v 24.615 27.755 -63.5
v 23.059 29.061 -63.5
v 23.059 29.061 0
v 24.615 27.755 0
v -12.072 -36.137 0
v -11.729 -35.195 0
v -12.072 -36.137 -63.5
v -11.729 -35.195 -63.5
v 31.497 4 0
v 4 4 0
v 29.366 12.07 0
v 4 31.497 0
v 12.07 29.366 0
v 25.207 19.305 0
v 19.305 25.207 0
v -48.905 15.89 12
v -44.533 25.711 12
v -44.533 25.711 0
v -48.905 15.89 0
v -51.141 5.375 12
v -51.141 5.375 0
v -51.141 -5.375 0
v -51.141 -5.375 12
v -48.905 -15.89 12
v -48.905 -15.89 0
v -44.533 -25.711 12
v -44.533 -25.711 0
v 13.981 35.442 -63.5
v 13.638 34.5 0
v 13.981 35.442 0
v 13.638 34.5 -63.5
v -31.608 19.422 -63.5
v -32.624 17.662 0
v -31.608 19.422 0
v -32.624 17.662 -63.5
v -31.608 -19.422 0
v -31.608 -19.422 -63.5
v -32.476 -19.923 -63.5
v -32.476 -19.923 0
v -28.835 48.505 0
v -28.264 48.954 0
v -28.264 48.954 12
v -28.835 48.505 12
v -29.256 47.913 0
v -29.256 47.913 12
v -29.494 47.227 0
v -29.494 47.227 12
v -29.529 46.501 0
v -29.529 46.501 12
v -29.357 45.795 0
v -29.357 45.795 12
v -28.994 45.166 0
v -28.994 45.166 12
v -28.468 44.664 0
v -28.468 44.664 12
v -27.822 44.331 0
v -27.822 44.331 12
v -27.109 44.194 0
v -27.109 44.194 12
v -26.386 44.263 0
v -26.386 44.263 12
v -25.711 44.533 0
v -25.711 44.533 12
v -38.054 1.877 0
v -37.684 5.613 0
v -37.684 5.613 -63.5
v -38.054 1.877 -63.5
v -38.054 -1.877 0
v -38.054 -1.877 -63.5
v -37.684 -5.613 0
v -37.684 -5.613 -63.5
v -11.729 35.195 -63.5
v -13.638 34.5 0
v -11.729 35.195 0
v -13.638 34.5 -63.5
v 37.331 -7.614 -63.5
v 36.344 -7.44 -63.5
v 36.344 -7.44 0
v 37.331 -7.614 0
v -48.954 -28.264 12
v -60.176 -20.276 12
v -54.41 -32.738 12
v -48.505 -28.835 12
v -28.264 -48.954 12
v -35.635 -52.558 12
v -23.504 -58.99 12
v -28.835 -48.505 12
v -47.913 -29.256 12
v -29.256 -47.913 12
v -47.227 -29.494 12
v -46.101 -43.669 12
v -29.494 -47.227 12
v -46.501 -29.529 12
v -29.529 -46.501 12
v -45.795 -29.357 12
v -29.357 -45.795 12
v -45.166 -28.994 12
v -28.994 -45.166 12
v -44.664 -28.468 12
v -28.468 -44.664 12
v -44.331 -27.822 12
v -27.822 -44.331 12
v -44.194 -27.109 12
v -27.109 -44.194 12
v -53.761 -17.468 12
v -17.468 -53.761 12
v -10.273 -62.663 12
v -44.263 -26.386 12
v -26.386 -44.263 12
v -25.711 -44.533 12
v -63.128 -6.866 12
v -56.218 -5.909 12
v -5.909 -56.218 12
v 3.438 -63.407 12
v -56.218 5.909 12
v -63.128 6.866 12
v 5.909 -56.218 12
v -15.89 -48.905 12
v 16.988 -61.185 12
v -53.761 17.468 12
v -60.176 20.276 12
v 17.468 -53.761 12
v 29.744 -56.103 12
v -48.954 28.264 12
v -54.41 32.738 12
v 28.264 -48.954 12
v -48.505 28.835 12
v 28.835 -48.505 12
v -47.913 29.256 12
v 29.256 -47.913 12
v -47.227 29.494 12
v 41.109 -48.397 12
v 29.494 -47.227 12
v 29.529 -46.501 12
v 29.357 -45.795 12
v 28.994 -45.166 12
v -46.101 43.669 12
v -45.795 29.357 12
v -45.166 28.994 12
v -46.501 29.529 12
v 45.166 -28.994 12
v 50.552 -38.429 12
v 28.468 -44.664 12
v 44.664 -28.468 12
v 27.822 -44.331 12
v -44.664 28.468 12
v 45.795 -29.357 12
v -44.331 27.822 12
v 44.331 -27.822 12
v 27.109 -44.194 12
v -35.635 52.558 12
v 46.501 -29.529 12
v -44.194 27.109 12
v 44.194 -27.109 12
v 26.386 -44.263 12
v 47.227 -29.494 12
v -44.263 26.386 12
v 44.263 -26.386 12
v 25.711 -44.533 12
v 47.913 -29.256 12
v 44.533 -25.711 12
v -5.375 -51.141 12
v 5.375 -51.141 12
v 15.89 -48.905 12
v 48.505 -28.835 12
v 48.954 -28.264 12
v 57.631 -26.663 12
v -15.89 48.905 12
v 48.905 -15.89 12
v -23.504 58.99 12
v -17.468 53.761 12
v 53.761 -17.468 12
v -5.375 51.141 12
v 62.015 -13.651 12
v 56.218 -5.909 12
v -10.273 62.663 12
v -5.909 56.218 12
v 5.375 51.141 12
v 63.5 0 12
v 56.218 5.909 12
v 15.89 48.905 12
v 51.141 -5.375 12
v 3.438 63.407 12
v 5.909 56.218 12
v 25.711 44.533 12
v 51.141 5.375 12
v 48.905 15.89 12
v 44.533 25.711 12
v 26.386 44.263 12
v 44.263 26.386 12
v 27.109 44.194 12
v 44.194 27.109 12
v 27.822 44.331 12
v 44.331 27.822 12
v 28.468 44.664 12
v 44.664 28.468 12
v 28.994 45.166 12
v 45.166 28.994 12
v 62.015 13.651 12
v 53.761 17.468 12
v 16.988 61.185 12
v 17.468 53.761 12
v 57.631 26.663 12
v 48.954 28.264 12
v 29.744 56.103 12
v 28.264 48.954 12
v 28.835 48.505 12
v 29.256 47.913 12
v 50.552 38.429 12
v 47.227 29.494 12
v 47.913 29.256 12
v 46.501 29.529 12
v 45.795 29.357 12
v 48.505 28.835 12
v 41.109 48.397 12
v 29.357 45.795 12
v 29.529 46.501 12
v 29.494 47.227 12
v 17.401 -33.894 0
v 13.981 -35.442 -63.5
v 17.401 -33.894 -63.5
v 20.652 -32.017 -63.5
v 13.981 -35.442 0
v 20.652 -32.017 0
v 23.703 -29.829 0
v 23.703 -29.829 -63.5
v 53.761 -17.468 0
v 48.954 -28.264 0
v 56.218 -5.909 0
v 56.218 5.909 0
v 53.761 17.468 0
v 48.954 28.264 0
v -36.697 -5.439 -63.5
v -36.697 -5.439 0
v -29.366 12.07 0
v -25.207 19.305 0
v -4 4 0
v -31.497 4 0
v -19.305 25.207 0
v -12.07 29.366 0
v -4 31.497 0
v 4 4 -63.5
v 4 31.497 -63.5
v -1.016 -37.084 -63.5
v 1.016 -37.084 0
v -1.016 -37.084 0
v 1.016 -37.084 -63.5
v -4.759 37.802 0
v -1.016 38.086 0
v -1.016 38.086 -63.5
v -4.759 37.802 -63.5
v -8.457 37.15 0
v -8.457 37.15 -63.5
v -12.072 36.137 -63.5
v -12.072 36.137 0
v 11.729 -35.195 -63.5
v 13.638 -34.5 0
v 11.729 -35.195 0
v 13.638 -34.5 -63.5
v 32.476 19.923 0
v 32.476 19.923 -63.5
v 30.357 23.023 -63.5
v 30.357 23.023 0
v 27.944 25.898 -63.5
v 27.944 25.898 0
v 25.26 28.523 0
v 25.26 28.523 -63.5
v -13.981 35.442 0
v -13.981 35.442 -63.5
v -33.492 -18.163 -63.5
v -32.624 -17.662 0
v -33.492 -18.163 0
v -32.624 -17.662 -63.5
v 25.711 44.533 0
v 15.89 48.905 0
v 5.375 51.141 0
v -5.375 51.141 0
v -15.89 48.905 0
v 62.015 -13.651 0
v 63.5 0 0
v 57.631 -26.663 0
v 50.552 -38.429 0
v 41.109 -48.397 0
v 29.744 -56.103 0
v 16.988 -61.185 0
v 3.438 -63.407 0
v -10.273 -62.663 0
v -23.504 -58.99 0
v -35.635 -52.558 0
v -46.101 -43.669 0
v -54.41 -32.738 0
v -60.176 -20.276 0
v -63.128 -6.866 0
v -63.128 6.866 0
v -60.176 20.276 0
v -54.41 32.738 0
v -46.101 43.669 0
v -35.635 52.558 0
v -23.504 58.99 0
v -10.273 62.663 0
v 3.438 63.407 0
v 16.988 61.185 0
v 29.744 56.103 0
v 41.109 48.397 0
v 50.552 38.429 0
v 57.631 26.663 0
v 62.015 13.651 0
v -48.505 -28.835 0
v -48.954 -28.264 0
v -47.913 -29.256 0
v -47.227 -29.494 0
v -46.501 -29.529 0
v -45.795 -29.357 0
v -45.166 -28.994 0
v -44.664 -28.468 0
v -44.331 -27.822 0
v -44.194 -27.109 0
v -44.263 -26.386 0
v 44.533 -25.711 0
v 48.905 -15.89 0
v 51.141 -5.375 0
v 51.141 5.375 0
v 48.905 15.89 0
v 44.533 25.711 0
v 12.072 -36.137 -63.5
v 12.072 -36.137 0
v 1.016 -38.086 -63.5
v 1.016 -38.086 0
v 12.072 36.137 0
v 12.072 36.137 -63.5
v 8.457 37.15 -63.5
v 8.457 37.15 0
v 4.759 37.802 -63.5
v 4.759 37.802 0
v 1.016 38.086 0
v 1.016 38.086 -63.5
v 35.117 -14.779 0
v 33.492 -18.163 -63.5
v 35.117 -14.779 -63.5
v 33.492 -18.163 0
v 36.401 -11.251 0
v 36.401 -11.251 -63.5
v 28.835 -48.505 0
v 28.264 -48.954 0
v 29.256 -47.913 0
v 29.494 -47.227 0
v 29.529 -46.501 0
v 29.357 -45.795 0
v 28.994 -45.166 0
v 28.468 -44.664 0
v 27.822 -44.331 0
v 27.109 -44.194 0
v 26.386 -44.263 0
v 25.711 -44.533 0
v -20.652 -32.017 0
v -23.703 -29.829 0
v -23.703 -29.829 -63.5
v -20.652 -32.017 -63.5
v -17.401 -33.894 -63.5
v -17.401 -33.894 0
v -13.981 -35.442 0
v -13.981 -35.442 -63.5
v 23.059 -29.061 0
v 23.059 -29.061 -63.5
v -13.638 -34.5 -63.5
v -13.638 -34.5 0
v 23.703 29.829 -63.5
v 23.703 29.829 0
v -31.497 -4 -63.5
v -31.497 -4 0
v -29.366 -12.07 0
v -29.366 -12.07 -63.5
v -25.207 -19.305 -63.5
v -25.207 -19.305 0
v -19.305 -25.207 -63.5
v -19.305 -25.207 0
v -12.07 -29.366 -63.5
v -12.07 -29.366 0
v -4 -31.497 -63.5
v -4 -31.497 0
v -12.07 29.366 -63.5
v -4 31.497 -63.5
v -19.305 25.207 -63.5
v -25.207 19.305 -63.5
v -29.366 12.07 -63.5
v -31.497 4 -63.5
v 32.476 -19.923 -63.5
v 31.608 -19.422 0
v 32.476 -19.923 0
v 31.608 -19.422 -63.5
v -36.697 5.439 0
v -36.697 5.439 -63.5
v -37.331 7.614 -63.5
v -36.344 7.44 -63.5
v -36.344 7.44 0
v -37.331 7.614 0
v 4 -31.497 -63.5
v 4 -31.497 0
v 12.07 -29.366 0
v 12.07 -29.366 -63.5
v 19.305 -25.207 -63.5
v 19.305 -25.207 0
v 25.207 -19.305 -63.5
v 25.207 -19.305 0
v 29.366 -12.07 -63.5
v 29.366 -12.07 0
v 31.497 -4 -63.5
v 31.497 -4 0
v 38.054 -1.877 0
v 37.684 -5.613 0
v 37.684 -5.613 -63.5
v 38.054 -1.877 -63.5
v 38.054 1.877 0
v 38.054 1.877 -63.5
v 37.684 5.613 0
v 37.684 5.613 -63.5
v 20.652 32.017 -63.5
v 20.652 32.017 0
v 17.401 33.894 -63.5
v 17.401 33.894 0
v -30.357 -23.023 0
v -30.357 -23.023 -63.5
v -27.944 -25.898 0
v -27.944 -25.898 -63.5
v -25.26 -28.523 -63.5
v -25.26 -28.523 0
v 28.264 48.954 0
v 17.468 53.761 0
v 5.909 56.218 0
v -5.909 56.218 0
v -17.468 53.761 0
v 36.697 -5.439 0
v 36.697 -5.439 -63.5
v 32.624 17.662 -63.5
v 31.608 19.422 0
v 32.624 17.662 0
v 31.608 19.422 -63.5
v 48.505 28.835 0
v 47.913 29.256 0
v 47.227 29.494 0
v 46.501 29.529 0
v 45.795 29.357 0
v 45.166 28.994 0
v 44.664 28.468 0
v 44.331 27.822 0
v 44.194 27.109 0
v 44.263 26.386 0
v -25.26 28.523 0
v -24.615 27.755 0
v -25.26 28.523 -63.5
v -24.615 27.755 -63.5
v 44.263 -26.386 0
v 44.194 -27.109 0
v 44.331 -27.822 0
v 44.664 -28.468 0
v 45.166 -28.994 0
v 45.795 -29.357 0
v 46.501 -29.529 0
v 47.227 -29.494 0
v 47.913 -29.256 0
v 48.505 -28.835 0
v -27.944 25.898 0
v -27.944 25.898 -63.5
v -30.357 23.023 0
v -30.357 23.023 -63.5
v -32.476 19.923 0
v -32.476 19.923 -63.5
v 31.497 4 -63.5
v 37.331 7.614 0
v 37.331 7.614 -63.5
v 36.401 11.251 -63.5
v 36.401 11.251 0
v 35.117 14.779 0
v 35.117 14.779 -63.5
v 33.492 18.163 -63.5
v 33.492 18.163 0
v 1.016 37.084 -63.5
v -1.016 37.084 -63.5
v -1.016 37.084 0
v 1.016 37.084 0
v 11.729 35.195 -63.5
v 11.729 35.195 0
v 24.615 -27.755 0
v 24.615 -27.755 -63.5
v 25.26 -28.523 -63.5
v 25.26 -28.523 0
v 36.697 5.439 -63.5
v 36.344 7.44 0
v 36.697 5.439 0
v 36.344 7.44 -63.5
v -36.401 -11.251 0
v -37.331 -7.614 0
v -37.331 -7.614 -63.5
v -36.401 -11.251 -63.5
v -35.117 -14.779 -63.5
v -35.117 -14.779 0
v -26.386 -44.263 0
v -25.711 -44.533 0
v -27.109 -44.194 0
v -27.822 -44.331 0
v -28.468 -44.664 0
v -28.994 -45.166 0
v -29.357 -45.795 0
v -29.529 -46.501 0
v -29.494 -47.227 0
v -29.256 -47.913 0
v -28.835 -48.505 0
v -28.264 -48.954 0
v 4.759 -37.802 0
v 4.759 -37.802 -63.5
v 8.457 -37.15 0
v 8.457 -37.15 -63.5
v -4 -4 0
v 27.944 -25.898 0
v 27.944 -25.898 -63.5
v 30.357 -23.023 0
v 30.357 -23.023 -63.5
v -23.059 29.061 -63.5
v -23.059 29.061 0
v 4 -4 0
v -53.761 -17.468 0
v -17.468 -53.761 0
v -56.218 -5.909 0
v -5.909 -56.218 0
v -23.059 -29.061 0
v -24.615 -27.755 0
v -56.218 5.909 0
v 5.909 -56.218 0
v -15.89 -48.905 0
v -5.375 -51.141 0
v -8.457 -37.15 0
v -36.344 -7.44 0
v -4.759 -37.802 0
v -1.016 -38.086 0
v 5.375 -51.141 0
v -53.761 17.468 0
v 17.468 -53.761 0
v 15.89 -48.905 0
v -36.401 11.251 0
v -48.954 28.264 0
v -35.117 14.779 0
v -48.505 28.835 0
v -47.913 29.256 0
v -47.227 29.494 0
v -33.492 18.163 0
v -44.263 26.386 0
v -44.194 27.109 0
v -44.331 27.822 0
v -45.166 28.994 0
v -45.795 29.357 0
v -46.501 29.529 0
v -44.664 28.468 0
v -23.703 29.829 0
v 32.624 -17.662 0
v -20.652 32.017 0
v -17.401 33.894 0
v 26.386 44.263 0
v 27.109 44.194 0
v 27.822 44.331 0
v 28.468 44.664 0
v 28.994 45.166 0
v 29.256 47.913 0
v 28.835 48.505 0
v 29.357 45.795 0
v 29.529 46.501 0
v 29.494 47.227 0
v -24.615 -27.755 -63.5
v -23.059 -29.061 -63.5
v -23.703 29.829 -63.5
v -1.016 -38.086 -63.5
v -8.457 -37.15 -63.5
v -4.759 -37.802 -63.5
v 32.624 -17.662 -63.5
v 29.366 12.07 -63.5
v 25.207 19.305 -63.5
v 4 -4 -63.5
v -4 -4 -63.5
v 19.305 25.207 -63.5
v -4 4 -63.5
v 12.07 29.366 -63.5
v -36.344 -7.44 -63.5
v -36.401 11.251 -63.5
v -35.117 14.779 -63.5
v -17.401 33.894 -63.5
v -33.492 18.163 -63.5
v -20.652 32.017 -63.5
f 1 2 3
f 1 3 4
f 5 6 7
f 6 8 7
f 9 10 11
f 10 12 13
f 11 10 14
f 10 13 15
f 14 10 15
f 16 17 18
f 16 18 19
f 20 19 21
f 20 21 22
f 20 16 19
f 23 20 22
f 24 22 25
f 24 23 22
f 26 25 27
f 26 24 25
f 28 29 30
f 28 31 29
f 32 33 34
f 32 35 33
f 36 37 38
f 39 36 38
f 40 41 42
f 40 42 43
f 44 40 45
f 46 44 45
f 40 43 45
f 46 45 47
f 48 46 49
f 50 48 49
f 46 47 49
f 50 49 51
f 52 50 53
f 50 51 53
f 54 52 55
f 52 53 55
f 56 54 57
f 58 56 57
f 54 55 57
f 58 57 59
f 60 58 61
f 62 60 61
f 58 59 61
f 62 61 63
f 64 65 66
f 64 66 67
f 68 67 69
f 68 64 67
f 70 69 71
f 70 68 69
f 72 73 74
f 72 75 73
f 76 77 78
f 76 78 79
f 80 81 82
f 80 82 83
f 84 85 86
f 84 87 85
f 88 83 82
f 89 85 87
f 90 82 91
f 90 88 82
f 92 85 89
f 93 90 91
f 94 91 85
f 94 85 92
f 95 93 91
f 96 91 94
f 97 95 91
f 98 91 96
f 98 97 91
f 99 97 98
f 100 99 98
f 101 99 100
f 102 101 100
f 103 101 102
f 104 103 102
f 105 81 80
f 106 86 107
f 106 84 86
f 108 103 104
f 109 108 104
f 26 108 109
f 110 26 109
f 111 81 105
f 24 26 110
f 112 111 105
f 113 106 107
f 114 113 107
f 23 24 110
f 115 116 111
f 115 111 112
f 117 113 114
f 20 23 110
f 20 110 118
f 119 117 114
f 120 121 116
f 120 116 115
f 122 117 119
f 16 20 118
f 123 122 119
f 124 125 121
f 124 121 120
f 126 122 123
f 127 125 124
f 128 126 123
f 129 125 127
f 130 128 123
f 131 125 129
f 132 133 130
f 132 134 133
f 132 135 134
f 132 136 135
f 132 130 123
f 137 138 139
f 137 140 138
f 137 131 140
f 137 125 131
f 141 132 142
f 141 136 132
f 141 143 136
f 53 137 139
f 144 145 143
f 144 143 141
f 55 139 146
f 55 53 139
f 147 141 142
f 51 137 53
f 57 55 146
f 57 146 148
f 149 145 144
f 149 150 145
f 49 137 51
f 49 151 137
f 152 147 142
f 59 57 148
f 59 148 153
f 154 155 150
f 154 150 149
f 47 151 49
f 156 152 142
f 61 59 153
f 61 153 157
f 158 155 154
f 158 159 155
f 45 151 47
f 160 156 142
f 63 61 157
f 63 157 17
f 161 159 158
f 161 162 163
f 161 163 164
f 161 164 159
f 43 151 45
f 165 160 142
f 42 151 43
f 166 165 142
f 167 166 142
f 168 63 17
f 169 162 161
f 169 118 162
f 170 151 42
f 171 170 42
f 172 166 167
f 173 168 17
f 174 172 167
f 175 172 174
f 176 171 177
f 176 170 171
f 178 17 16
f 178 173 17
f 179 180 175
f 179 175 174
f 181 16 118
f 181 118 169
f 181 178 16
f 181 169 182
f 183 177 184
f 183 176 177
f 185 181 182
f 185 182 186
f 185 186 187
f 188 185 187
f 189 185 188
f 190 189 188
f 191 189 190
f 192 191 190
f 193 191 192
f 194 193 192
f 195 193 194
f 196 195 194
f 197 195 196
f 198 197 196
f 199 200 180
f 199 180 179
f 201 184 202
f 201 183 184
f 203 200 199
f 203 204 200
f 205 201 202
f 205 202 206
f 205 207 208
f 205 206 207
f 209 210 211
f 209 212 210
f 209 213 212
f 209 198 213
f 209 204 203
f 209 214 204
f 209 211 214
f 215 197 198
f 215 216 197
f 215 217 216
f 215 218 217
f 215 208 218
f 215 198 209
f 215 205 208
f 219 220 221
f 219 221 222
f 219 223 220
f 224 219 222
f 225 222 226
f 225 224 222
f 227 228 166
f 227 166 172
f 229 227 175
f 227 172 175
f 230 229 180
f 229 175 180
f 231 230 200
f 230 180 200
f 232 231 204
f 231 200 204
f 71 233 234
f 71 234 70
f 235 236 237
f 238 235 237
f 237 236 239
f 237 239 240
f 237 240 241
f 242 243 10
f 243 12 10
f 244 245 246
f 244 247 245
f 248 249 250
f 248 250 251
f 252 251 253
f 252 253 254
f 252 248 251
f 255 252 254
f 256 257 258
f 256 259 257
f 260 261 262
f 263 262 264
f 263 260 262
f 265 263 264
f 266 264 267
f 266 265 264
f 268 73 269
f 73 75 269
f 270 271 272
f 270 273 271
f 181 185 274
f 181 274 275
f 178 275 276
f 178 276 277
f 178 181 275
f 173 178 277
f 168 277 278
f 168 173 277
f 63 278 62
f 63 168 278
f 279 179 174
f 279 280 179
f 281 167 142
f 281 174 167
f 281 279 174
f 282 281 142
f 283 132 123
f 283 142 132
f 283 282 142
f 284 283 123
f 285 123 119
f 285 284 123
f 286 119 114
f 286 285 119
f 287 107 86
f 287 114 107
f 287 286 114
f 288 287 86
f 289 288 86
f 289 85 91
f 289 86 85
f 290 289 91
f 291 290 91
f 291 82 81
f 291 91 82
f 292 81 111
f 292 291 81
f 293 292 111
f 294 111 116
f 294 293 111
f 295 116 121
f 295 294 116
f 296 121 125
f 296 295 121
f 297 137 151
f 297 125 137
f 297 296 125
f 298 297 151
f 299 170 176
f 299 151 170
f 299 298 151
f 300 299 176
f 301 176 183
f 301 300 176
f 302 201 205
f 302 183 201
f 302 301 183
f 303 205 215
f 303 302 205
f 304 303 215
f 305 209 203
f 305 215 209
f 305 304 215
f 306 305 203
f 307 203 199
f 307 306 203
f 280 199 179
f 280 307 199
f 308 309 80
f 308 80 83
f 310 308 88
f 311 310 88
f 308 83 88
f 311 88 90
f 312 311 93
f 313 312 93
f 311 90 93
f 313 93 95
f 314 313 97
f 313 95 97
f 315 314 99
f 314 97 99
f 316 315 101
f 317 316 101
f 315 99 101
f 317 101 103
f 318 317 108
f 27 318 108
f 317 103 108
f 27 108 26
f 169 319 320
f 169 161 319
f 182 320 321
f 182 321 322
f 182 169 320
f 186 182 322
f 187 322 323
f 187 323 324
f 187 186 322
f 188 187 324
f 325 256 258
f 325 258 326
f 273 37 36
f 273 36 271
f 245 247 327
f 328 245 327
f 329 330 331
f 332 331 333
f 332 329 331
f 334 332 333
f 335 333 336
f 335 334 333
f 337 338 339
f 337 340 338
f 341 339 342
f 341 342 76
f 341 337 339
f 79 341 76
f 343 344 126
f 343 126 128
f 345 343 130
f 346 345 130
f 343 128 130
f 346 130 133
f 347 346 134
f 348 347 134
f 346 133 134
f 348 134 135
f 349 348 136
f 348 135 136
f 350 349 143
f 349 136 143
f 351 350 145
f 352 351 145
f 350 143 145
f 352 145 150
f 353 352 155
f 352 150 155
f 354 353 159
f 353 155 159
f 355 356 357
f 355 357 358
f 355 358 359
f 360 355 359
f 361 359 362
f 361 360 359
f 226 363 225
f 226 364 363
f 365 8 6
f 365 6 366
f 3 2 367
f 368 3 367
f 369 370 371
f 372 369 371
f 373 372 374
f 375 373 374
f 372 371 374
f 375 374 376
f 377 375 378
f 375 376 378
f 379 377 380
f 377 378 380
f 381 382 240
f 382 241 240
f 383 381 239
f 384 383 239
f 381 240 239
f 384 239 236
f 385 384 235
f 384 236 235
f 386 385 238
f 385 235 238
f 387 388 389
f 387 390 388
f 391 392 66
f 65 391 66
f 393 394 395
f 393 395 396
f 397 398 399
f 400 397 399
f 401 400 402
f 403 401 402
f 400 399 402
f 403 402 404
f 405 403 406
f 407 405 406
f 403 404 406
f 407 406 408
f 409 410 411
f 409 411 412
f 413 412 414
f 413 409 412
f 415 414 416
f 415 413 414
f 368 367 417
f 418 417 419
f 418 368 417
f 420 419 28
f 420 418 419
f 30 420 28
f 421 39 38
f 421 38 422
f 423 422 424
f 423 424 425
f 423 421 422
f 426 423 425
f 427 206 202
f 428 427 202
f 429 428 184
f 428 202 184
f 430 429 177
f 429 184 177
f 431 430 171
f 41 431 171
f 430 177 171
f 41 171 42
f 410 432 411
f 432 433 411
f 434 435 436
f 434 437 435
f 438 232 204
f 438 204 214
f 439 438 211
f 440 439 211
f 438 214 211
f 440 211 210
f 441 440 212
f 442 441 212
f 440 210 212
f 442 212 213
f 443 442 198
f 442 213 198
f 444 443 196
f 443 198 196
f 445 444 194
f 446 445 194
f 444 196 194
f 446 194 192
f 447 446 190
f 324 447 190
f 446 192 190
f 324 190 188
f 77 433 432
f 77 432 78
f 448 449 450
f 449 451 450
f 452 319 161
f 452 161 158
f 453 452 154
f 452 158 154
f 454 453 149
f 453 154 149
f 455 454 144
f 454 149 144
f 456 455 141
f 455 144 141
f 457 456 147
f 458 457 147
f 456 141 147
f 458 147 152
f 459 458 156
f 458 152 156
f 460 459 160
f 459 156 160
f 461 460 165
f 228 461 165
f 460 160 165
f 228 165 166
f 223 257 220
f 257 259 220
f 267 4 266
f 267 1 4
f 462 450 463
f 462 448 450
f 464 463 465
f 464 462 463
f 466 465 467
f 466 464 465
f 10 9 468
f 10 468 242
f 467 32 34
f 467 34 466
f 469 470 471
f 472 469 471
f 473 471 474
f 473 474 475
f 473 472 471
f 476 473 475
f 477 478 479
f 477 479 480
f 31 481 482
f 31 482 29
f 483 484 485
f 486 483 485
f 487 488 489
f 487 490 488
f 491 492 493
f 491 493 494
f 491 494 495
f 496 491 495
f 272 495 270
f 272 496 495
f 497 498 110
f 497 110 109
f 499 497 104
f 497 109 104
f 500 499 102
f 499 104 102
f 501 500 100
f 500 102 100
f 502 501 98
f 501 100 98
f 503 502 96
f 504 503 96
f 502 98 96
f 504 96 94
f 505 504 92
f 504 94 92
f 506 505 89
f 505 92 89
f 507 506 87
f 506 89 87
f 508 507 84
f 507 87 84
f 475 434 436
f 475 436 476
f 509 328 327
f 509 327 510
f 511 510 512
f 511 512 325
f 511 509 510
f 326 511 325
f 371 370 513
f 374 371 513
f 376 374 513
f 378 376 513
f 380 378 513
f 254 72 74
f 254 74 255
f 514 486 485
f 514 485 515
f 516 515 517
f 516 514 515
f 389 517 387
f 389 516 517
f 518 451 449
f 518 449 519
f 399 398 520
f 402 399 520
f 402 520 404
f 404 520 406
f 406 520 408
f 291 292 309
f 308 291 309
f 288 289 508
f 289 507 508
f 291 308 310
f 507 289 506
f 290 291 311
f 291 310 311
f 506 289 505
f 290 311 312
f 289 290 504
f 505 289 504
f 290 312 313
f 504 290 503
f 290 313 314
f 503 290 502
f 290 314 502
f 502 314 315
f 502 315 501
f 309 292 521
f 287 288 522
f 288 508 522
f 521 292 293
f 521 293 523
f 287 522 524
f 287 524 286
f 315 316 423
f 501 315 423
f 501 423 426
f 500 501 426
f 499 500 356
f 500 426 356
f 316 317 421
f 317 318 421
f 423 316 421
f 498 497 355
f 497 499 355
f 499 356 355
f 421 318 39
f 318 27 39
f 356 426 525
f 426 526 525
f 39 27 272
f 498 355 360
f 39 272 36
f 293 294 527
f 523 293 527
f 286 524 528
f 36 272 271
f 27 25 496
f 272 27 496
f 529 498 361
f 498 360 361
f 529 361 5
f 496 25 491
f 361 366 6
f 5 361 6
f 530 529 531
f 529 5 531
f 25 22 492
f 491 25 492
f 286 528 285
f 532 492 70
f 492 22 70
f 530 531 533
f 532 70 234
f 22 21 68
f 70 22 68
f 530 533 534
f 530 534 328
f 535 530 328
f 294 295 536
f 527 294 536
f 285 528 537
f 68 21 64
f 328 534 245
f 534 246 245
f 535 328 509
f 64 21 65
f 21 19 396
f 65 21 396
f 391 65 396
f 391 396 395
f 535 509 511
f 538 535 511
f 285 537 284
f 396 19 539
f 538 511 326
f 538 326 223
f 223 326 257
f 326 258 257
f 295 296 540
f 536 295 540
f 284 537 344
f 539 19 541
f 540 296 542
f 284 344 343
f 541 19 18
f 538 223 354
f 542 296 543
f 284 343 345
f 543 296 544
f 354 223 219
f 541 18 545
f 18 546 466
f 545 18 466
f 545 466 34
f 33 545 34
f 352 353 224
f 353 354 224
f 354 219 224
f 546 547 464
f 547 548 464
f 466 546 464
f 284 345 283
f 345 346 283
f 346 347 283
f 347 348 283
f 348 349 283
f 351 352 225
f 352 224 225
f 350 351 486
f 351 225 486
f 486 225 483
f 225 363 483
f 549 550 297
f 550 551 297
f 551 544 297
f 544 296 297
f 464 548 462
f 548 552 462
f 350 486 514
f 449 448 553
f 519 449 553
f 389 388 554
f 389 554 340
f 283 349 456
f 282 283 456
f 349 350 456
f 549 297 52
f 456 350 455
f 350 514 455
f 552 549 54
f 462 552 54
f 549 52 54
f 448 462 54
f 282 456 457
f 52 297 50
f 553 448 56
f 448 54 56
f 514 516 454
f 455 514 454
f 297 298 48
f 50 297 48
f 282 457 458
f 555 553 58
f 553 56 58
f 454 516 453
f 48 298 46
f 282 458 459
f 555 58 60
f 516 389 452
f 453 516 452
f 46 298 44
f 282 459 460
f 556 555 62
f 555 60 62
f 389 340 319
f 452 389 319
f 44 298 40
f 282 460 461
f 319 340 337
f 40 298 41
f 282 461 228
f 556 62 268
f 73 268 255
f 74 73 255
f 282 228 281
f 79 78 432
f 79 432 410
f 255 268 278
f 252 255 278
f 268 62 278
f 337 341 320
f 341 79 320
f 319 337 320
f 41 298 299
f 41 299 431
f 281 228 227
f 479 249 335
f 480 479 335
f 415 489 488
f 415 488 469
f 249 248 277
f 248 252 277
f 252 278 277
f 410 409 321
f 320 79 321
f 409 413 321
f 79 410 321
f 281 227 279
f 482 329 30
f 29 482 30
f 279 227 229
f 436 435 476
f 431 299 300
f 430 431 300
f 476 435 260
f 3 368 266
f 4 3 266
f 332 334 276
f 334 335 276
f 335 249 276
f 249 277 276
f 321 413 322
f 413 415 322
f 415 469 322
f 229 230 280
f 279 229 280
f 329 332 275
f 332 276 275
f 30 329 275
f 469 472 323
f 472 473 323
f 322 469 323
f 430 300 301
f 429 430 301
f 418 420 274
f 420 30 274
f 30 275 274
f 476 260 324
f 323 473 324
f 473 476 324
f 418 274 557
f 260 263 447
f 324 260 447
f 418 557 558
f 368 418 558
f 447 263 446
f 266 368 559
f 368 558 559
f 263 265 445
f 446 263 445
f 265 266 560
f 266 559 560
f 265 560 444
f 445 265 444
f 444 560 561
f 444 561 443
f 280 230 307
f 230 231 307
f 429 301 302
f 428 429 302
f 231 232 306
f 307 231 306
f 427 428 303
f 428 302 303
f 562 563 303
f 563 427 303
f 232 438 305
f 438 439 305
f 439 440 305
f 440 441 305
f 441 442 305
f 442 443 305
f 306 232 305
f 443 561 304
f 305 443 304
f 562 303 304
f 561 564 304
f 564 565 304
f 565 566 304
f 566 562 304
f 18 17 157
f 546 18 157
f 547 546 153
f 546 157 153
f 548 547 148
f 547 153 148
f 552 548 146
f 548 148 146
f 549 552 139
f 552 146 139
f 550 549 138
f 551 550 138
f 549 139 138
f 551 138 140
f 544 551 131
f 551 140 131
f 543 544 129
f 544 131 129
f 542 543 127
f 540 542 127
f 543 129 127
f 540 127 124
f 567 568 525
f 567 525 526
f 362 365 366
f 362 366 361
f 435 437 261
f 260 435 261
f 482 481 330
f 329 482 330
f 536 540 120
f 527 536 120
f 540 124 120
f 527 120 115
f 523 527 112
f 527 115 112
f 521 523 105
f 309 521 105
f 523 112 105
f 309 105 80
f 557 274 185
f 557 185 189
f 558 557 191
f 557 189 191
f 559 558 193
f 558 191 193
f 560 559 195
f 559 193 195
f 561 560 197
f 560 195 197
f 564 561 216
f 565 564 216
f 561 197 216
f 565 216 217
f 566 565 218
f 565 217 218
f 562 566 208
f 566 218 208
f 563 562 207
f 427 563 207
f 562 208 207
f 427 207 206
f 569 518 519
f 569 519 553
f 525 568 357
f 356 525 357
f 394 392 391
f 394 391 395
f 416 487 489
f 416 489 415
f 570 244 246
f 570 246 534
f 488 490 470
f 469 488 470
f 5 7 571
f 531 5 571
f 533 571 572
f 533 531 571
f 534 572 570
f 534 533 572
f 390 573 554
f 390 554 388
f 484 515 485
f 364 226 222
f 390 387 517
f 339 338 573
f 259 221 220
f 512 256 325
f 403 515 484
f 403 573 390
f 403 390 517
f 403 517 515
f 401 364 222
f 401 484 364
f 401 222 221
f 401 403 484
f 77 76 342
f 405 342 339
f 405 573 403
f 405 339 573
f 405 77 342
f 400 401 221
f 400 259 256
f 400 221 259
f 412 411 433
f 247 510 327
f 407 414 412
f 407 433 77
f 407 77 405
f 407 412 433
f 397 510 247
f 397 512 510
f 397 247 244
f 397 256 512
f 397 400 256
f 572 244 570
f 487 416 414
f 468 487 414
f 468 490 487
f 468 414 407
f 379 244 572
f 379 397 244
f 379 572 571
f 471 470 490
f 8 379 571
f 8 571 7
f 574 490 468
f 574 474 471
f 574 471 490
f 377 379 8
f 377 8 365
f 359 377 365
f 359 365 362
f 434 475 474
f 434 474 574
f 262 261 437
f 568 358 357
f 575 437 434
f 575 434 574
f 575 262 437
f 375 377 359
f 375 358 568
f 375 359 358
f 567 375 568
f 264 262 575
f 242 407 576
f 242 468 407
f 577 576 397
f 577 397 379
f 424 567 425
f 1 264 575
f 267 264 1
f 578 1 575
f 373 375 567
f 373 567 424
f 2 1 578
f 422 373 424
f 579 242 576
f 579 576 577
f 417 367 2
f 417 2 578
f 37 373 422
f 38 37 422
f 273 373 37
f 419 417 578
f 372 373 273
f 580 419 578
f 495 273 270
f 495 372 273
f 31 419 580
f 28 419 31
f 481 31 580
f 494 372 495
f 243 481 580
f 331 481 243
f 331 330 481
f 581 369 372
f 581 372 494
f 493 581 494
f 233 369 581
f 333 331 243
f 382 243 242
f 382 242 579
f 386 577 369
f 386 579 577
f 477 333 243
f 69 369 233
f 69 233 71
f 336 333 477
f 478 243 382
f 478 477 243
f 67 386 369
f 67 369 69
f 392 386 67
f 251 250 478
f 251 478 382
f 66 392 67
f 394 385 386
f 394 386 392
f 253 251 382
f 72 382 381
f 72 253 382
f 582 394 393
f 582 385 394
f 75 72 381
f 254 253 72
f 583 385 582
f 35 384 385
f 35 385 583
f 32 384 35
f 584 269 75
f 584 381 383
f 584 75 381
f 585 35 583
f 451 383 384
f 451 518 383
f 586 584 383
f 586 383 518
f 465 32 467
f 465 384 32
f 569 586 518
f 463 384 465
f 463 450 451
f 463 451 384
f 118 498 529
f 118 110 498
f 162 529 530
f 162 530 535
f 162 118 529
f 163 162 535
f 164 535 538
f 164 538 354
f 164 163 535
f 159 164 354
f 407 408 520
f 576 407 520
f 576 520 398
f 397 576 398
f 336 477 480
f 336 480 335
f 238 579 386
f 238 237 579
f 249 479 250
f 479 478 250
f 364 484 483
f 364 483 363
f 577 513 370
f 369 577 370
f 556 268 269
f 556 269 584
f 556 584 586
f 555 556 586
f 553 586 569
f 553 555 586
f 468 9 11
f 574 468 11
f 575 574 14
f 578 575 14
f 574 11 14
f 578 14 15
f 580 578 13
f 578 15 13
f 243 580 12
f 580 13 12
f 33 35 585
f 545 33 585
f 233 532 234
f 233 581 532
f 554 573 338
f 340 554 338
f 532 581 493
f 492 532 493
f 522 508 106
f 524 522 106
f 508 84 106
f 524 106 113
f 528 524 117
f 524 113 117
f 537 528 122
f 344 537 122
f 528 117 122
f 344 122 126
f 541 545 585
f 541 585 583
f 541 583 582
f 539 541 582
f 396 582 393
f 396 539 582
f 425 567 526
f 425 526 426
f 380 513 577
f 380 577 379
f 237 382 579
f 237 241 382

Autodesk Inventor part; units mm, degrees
ref_plane "YZ Plane" through (0, 0, 0) normal (1, 0, 0) x (0, 1, 0)
ref_plane "XZ Plane" through (0, 0, 0) normal (0, 1, 0) x (-1, 0, 0)
ref_plane "XY Plane" through (0, 0, 0) normal (0, 0, 1) x (1, 0, 0)
sketch "Sketch1" plane through (0, 0, 0) normal (0, 0, 1) x (1, 0, 0)
  circle A0 centre (0, 0) radius 38.1
  circle A1 centre (0, 0) radius 63.5
  circle A2 centre (0, 0) radius 31.75
  dimension "d1" = 76.2
  dimension "d7" = 6.35
  dimension "d45" = 127
extrude "Extrusion2" add sketch "Sketch1" along normal blind 12 contours A0 | A1 | A2
extrude "Extrusion3" add sketch "Sketch1" against normal blind 63.5 contours A0
sketch "Sketch6" plane through (0, 0, 12) normal (0, 0, 1) x (1, 0, 0)
  arc A0 (26.9875, 46.7437) -> (-26.9875, 46.7437) centre (0, 0) ccw construction
  arc A1 (28.2638, 48.9544) -> (-28.2639, 48.9544) centre (0, 0) ccw
  arc A2 (25.7111, 44.533) -> (-25.7112, 44.533) centre (0, 0) ccw
  arc A3 (25.7111, 44.533) -> (28.2638, 48.9544) centre (26.9875, 46.7437) ccw
  arc A4 (-28.2639, 48.9544) -> (-25.7112, 44.533) centre (-26.9875, 46.7437) ccw
  line L0 (0, 0) -> (26.9875, 46.7437) construction
  line L1 (0, 0) -> (53.975, 0) construction
  line L2 (0, 0) -> (-26.9875, 46.7437) construction
  dimension "d26" = 53.975
  dimension "d27" = 60
  dimension "d28" = 60
  dimension "d29" = 5.1054
extrude "Extrusion7" cut sketch "Sketch6" against normal through all
pattern_circular "Circular Pattern1" count 4 over 360 about axis through (0, 0, -10) along (0, 0, 1) of "Extrusion7"
sketch "Sketch8" plane through (0, 0, -63.5) normal (0, 0, -1) x (-1, 0, 0)
  circle A0 centre (0, 0) radius 38.1 projected
  arc A1 (0, 38.1) -> (-1.016, 38.0865) centre (0, 0) ccw
  line L0 (0, 0) -> (0, 38.1) construction
  line L1 (0, 38.1) -> (0, 37.084)
  line L2 (0, 37.084) -> (-1.016, 37.084)
  line L3 (-1.016, 37.084) -> (-1.016, 38.0865)
  circle A2 centre (0, 0) radius 38.1 projected
  circle A3 centre (0, 0) radius 38.1
  line L4 (0, 37.084) -> (1.016, 37.084)
  line L5 (1.016, 37.084) -> (1.016, 38.0865)
  dimension "d35" = 1.016
  dimension "d36" = 1.016
extrude "Extrusion9" cut sketch "Sketch8" against normal up to surface (63.5 mm away) contours L5 L4 L1 A0 | A0 L1 L2 L3
sketch "Sketch3" plane through (0, 0, 12) normal (0, 0, 1) x (1, 0, 0)
  ellipse E0 centre (0, 0) end of major axis (57.15, 0) minor radius 60.8178
  circle A0 centre (0, 0) radius 63.5 projected
  circle A1 centre (0, 0) radius 63.5
  point P0 (-57.15, 0)
  point P1 (57.15, 0)
  dimension "d11" = 60.8178
  dimension "d12" = 57.15
pattern_circular "Circular Pattern2" count 18 over 360 about axis through (0, 0, -10) along (0, 0, 1) of "Extrusion9"
sketch "Sketch9" plane through (0, 0, 0) normal (0, 0, -1) x (-1, 0, 0)
  point P0 (0, 0)
sketch "Sketch10" plane through (0, 0, 0) normal (0, 0, -1) x (-1, 0, 0)
  circle A0 centre (0, 0) radius 31.75 projected
  arc A1 (-31.497, 4) -> (-31.497, -4) centre (0, 0) ccw
  arc A2 (-4, -31.497) -> (4, -31.497) centre (0, 0) ccw
  arc A3 (31.497, -4) -> (31.497, 4) centre (0, 0) ccw
  arc A4 (4, 31.497) -> (-4, 31.497) centre (0, 0) ccw
  line L0 (-31.497, 4) -> (-4, 4)
  line L1 (4, 4) -> (31.497, 4)
  line L2 (-4, 31.497) -> (-4, 4)
  line L3 (-4, -4) -> (-4, -31.497)
  line L4 (4, 31.497) -> (4, 4)
  line L5 (4, -4) -> (4, -31.497)
  line L6 (-31.497, -4) -> (-4, -4)
  line L7 (4, -4) -> (31.497, -4)
extrude "Extrusion10" add sketch "Sketch10" along normal up to surface (63.5 mm away) contours A0 L7 L5 L3 L6 L0 L2 L4 L1
equation "\"d1\" = insideDiameterforPipe"
equation "\"d45\" = outsideDiameter"
equation "\"d8\" = insertDepthIntoPipe"
equation "\"d26\" = slotRadius"
equation "\"d28\" = totalAngleForSlot"
equation "\"d29\" = widthOfSlot"
equation "\"d11\" = 0.5 * elipseMajorDiameter"
equation "\"d12\" = 0.5 * elipseMinorDiameter"
equation "\"insideDiameterforPipe\" = 76.2"
equation "\"outsideDiameter\" = 127"
equation "\"elipseMajorDiameter\" = 121.63552"
equation "\"elipseMinorDiameter\" = 114.3"
equation "\"widthOfSlot\" = 5.1054"
equation "\"totalAngleForSlot\" = 60deg"
equation "\"slotDiameter\" = 0.5 * pipeExteriorDiameter + 0.5 * outsideDiameter"
equation "\"slotRadius\" = 0.5 * slotDiameter"
equation "\"pipeExteriorDiameter\" = 88.9"
equation "\"insertDepthIntoPipe\" = 63.5"
properties part number "3inPvcCap" material "PC/ABS Plastic"
